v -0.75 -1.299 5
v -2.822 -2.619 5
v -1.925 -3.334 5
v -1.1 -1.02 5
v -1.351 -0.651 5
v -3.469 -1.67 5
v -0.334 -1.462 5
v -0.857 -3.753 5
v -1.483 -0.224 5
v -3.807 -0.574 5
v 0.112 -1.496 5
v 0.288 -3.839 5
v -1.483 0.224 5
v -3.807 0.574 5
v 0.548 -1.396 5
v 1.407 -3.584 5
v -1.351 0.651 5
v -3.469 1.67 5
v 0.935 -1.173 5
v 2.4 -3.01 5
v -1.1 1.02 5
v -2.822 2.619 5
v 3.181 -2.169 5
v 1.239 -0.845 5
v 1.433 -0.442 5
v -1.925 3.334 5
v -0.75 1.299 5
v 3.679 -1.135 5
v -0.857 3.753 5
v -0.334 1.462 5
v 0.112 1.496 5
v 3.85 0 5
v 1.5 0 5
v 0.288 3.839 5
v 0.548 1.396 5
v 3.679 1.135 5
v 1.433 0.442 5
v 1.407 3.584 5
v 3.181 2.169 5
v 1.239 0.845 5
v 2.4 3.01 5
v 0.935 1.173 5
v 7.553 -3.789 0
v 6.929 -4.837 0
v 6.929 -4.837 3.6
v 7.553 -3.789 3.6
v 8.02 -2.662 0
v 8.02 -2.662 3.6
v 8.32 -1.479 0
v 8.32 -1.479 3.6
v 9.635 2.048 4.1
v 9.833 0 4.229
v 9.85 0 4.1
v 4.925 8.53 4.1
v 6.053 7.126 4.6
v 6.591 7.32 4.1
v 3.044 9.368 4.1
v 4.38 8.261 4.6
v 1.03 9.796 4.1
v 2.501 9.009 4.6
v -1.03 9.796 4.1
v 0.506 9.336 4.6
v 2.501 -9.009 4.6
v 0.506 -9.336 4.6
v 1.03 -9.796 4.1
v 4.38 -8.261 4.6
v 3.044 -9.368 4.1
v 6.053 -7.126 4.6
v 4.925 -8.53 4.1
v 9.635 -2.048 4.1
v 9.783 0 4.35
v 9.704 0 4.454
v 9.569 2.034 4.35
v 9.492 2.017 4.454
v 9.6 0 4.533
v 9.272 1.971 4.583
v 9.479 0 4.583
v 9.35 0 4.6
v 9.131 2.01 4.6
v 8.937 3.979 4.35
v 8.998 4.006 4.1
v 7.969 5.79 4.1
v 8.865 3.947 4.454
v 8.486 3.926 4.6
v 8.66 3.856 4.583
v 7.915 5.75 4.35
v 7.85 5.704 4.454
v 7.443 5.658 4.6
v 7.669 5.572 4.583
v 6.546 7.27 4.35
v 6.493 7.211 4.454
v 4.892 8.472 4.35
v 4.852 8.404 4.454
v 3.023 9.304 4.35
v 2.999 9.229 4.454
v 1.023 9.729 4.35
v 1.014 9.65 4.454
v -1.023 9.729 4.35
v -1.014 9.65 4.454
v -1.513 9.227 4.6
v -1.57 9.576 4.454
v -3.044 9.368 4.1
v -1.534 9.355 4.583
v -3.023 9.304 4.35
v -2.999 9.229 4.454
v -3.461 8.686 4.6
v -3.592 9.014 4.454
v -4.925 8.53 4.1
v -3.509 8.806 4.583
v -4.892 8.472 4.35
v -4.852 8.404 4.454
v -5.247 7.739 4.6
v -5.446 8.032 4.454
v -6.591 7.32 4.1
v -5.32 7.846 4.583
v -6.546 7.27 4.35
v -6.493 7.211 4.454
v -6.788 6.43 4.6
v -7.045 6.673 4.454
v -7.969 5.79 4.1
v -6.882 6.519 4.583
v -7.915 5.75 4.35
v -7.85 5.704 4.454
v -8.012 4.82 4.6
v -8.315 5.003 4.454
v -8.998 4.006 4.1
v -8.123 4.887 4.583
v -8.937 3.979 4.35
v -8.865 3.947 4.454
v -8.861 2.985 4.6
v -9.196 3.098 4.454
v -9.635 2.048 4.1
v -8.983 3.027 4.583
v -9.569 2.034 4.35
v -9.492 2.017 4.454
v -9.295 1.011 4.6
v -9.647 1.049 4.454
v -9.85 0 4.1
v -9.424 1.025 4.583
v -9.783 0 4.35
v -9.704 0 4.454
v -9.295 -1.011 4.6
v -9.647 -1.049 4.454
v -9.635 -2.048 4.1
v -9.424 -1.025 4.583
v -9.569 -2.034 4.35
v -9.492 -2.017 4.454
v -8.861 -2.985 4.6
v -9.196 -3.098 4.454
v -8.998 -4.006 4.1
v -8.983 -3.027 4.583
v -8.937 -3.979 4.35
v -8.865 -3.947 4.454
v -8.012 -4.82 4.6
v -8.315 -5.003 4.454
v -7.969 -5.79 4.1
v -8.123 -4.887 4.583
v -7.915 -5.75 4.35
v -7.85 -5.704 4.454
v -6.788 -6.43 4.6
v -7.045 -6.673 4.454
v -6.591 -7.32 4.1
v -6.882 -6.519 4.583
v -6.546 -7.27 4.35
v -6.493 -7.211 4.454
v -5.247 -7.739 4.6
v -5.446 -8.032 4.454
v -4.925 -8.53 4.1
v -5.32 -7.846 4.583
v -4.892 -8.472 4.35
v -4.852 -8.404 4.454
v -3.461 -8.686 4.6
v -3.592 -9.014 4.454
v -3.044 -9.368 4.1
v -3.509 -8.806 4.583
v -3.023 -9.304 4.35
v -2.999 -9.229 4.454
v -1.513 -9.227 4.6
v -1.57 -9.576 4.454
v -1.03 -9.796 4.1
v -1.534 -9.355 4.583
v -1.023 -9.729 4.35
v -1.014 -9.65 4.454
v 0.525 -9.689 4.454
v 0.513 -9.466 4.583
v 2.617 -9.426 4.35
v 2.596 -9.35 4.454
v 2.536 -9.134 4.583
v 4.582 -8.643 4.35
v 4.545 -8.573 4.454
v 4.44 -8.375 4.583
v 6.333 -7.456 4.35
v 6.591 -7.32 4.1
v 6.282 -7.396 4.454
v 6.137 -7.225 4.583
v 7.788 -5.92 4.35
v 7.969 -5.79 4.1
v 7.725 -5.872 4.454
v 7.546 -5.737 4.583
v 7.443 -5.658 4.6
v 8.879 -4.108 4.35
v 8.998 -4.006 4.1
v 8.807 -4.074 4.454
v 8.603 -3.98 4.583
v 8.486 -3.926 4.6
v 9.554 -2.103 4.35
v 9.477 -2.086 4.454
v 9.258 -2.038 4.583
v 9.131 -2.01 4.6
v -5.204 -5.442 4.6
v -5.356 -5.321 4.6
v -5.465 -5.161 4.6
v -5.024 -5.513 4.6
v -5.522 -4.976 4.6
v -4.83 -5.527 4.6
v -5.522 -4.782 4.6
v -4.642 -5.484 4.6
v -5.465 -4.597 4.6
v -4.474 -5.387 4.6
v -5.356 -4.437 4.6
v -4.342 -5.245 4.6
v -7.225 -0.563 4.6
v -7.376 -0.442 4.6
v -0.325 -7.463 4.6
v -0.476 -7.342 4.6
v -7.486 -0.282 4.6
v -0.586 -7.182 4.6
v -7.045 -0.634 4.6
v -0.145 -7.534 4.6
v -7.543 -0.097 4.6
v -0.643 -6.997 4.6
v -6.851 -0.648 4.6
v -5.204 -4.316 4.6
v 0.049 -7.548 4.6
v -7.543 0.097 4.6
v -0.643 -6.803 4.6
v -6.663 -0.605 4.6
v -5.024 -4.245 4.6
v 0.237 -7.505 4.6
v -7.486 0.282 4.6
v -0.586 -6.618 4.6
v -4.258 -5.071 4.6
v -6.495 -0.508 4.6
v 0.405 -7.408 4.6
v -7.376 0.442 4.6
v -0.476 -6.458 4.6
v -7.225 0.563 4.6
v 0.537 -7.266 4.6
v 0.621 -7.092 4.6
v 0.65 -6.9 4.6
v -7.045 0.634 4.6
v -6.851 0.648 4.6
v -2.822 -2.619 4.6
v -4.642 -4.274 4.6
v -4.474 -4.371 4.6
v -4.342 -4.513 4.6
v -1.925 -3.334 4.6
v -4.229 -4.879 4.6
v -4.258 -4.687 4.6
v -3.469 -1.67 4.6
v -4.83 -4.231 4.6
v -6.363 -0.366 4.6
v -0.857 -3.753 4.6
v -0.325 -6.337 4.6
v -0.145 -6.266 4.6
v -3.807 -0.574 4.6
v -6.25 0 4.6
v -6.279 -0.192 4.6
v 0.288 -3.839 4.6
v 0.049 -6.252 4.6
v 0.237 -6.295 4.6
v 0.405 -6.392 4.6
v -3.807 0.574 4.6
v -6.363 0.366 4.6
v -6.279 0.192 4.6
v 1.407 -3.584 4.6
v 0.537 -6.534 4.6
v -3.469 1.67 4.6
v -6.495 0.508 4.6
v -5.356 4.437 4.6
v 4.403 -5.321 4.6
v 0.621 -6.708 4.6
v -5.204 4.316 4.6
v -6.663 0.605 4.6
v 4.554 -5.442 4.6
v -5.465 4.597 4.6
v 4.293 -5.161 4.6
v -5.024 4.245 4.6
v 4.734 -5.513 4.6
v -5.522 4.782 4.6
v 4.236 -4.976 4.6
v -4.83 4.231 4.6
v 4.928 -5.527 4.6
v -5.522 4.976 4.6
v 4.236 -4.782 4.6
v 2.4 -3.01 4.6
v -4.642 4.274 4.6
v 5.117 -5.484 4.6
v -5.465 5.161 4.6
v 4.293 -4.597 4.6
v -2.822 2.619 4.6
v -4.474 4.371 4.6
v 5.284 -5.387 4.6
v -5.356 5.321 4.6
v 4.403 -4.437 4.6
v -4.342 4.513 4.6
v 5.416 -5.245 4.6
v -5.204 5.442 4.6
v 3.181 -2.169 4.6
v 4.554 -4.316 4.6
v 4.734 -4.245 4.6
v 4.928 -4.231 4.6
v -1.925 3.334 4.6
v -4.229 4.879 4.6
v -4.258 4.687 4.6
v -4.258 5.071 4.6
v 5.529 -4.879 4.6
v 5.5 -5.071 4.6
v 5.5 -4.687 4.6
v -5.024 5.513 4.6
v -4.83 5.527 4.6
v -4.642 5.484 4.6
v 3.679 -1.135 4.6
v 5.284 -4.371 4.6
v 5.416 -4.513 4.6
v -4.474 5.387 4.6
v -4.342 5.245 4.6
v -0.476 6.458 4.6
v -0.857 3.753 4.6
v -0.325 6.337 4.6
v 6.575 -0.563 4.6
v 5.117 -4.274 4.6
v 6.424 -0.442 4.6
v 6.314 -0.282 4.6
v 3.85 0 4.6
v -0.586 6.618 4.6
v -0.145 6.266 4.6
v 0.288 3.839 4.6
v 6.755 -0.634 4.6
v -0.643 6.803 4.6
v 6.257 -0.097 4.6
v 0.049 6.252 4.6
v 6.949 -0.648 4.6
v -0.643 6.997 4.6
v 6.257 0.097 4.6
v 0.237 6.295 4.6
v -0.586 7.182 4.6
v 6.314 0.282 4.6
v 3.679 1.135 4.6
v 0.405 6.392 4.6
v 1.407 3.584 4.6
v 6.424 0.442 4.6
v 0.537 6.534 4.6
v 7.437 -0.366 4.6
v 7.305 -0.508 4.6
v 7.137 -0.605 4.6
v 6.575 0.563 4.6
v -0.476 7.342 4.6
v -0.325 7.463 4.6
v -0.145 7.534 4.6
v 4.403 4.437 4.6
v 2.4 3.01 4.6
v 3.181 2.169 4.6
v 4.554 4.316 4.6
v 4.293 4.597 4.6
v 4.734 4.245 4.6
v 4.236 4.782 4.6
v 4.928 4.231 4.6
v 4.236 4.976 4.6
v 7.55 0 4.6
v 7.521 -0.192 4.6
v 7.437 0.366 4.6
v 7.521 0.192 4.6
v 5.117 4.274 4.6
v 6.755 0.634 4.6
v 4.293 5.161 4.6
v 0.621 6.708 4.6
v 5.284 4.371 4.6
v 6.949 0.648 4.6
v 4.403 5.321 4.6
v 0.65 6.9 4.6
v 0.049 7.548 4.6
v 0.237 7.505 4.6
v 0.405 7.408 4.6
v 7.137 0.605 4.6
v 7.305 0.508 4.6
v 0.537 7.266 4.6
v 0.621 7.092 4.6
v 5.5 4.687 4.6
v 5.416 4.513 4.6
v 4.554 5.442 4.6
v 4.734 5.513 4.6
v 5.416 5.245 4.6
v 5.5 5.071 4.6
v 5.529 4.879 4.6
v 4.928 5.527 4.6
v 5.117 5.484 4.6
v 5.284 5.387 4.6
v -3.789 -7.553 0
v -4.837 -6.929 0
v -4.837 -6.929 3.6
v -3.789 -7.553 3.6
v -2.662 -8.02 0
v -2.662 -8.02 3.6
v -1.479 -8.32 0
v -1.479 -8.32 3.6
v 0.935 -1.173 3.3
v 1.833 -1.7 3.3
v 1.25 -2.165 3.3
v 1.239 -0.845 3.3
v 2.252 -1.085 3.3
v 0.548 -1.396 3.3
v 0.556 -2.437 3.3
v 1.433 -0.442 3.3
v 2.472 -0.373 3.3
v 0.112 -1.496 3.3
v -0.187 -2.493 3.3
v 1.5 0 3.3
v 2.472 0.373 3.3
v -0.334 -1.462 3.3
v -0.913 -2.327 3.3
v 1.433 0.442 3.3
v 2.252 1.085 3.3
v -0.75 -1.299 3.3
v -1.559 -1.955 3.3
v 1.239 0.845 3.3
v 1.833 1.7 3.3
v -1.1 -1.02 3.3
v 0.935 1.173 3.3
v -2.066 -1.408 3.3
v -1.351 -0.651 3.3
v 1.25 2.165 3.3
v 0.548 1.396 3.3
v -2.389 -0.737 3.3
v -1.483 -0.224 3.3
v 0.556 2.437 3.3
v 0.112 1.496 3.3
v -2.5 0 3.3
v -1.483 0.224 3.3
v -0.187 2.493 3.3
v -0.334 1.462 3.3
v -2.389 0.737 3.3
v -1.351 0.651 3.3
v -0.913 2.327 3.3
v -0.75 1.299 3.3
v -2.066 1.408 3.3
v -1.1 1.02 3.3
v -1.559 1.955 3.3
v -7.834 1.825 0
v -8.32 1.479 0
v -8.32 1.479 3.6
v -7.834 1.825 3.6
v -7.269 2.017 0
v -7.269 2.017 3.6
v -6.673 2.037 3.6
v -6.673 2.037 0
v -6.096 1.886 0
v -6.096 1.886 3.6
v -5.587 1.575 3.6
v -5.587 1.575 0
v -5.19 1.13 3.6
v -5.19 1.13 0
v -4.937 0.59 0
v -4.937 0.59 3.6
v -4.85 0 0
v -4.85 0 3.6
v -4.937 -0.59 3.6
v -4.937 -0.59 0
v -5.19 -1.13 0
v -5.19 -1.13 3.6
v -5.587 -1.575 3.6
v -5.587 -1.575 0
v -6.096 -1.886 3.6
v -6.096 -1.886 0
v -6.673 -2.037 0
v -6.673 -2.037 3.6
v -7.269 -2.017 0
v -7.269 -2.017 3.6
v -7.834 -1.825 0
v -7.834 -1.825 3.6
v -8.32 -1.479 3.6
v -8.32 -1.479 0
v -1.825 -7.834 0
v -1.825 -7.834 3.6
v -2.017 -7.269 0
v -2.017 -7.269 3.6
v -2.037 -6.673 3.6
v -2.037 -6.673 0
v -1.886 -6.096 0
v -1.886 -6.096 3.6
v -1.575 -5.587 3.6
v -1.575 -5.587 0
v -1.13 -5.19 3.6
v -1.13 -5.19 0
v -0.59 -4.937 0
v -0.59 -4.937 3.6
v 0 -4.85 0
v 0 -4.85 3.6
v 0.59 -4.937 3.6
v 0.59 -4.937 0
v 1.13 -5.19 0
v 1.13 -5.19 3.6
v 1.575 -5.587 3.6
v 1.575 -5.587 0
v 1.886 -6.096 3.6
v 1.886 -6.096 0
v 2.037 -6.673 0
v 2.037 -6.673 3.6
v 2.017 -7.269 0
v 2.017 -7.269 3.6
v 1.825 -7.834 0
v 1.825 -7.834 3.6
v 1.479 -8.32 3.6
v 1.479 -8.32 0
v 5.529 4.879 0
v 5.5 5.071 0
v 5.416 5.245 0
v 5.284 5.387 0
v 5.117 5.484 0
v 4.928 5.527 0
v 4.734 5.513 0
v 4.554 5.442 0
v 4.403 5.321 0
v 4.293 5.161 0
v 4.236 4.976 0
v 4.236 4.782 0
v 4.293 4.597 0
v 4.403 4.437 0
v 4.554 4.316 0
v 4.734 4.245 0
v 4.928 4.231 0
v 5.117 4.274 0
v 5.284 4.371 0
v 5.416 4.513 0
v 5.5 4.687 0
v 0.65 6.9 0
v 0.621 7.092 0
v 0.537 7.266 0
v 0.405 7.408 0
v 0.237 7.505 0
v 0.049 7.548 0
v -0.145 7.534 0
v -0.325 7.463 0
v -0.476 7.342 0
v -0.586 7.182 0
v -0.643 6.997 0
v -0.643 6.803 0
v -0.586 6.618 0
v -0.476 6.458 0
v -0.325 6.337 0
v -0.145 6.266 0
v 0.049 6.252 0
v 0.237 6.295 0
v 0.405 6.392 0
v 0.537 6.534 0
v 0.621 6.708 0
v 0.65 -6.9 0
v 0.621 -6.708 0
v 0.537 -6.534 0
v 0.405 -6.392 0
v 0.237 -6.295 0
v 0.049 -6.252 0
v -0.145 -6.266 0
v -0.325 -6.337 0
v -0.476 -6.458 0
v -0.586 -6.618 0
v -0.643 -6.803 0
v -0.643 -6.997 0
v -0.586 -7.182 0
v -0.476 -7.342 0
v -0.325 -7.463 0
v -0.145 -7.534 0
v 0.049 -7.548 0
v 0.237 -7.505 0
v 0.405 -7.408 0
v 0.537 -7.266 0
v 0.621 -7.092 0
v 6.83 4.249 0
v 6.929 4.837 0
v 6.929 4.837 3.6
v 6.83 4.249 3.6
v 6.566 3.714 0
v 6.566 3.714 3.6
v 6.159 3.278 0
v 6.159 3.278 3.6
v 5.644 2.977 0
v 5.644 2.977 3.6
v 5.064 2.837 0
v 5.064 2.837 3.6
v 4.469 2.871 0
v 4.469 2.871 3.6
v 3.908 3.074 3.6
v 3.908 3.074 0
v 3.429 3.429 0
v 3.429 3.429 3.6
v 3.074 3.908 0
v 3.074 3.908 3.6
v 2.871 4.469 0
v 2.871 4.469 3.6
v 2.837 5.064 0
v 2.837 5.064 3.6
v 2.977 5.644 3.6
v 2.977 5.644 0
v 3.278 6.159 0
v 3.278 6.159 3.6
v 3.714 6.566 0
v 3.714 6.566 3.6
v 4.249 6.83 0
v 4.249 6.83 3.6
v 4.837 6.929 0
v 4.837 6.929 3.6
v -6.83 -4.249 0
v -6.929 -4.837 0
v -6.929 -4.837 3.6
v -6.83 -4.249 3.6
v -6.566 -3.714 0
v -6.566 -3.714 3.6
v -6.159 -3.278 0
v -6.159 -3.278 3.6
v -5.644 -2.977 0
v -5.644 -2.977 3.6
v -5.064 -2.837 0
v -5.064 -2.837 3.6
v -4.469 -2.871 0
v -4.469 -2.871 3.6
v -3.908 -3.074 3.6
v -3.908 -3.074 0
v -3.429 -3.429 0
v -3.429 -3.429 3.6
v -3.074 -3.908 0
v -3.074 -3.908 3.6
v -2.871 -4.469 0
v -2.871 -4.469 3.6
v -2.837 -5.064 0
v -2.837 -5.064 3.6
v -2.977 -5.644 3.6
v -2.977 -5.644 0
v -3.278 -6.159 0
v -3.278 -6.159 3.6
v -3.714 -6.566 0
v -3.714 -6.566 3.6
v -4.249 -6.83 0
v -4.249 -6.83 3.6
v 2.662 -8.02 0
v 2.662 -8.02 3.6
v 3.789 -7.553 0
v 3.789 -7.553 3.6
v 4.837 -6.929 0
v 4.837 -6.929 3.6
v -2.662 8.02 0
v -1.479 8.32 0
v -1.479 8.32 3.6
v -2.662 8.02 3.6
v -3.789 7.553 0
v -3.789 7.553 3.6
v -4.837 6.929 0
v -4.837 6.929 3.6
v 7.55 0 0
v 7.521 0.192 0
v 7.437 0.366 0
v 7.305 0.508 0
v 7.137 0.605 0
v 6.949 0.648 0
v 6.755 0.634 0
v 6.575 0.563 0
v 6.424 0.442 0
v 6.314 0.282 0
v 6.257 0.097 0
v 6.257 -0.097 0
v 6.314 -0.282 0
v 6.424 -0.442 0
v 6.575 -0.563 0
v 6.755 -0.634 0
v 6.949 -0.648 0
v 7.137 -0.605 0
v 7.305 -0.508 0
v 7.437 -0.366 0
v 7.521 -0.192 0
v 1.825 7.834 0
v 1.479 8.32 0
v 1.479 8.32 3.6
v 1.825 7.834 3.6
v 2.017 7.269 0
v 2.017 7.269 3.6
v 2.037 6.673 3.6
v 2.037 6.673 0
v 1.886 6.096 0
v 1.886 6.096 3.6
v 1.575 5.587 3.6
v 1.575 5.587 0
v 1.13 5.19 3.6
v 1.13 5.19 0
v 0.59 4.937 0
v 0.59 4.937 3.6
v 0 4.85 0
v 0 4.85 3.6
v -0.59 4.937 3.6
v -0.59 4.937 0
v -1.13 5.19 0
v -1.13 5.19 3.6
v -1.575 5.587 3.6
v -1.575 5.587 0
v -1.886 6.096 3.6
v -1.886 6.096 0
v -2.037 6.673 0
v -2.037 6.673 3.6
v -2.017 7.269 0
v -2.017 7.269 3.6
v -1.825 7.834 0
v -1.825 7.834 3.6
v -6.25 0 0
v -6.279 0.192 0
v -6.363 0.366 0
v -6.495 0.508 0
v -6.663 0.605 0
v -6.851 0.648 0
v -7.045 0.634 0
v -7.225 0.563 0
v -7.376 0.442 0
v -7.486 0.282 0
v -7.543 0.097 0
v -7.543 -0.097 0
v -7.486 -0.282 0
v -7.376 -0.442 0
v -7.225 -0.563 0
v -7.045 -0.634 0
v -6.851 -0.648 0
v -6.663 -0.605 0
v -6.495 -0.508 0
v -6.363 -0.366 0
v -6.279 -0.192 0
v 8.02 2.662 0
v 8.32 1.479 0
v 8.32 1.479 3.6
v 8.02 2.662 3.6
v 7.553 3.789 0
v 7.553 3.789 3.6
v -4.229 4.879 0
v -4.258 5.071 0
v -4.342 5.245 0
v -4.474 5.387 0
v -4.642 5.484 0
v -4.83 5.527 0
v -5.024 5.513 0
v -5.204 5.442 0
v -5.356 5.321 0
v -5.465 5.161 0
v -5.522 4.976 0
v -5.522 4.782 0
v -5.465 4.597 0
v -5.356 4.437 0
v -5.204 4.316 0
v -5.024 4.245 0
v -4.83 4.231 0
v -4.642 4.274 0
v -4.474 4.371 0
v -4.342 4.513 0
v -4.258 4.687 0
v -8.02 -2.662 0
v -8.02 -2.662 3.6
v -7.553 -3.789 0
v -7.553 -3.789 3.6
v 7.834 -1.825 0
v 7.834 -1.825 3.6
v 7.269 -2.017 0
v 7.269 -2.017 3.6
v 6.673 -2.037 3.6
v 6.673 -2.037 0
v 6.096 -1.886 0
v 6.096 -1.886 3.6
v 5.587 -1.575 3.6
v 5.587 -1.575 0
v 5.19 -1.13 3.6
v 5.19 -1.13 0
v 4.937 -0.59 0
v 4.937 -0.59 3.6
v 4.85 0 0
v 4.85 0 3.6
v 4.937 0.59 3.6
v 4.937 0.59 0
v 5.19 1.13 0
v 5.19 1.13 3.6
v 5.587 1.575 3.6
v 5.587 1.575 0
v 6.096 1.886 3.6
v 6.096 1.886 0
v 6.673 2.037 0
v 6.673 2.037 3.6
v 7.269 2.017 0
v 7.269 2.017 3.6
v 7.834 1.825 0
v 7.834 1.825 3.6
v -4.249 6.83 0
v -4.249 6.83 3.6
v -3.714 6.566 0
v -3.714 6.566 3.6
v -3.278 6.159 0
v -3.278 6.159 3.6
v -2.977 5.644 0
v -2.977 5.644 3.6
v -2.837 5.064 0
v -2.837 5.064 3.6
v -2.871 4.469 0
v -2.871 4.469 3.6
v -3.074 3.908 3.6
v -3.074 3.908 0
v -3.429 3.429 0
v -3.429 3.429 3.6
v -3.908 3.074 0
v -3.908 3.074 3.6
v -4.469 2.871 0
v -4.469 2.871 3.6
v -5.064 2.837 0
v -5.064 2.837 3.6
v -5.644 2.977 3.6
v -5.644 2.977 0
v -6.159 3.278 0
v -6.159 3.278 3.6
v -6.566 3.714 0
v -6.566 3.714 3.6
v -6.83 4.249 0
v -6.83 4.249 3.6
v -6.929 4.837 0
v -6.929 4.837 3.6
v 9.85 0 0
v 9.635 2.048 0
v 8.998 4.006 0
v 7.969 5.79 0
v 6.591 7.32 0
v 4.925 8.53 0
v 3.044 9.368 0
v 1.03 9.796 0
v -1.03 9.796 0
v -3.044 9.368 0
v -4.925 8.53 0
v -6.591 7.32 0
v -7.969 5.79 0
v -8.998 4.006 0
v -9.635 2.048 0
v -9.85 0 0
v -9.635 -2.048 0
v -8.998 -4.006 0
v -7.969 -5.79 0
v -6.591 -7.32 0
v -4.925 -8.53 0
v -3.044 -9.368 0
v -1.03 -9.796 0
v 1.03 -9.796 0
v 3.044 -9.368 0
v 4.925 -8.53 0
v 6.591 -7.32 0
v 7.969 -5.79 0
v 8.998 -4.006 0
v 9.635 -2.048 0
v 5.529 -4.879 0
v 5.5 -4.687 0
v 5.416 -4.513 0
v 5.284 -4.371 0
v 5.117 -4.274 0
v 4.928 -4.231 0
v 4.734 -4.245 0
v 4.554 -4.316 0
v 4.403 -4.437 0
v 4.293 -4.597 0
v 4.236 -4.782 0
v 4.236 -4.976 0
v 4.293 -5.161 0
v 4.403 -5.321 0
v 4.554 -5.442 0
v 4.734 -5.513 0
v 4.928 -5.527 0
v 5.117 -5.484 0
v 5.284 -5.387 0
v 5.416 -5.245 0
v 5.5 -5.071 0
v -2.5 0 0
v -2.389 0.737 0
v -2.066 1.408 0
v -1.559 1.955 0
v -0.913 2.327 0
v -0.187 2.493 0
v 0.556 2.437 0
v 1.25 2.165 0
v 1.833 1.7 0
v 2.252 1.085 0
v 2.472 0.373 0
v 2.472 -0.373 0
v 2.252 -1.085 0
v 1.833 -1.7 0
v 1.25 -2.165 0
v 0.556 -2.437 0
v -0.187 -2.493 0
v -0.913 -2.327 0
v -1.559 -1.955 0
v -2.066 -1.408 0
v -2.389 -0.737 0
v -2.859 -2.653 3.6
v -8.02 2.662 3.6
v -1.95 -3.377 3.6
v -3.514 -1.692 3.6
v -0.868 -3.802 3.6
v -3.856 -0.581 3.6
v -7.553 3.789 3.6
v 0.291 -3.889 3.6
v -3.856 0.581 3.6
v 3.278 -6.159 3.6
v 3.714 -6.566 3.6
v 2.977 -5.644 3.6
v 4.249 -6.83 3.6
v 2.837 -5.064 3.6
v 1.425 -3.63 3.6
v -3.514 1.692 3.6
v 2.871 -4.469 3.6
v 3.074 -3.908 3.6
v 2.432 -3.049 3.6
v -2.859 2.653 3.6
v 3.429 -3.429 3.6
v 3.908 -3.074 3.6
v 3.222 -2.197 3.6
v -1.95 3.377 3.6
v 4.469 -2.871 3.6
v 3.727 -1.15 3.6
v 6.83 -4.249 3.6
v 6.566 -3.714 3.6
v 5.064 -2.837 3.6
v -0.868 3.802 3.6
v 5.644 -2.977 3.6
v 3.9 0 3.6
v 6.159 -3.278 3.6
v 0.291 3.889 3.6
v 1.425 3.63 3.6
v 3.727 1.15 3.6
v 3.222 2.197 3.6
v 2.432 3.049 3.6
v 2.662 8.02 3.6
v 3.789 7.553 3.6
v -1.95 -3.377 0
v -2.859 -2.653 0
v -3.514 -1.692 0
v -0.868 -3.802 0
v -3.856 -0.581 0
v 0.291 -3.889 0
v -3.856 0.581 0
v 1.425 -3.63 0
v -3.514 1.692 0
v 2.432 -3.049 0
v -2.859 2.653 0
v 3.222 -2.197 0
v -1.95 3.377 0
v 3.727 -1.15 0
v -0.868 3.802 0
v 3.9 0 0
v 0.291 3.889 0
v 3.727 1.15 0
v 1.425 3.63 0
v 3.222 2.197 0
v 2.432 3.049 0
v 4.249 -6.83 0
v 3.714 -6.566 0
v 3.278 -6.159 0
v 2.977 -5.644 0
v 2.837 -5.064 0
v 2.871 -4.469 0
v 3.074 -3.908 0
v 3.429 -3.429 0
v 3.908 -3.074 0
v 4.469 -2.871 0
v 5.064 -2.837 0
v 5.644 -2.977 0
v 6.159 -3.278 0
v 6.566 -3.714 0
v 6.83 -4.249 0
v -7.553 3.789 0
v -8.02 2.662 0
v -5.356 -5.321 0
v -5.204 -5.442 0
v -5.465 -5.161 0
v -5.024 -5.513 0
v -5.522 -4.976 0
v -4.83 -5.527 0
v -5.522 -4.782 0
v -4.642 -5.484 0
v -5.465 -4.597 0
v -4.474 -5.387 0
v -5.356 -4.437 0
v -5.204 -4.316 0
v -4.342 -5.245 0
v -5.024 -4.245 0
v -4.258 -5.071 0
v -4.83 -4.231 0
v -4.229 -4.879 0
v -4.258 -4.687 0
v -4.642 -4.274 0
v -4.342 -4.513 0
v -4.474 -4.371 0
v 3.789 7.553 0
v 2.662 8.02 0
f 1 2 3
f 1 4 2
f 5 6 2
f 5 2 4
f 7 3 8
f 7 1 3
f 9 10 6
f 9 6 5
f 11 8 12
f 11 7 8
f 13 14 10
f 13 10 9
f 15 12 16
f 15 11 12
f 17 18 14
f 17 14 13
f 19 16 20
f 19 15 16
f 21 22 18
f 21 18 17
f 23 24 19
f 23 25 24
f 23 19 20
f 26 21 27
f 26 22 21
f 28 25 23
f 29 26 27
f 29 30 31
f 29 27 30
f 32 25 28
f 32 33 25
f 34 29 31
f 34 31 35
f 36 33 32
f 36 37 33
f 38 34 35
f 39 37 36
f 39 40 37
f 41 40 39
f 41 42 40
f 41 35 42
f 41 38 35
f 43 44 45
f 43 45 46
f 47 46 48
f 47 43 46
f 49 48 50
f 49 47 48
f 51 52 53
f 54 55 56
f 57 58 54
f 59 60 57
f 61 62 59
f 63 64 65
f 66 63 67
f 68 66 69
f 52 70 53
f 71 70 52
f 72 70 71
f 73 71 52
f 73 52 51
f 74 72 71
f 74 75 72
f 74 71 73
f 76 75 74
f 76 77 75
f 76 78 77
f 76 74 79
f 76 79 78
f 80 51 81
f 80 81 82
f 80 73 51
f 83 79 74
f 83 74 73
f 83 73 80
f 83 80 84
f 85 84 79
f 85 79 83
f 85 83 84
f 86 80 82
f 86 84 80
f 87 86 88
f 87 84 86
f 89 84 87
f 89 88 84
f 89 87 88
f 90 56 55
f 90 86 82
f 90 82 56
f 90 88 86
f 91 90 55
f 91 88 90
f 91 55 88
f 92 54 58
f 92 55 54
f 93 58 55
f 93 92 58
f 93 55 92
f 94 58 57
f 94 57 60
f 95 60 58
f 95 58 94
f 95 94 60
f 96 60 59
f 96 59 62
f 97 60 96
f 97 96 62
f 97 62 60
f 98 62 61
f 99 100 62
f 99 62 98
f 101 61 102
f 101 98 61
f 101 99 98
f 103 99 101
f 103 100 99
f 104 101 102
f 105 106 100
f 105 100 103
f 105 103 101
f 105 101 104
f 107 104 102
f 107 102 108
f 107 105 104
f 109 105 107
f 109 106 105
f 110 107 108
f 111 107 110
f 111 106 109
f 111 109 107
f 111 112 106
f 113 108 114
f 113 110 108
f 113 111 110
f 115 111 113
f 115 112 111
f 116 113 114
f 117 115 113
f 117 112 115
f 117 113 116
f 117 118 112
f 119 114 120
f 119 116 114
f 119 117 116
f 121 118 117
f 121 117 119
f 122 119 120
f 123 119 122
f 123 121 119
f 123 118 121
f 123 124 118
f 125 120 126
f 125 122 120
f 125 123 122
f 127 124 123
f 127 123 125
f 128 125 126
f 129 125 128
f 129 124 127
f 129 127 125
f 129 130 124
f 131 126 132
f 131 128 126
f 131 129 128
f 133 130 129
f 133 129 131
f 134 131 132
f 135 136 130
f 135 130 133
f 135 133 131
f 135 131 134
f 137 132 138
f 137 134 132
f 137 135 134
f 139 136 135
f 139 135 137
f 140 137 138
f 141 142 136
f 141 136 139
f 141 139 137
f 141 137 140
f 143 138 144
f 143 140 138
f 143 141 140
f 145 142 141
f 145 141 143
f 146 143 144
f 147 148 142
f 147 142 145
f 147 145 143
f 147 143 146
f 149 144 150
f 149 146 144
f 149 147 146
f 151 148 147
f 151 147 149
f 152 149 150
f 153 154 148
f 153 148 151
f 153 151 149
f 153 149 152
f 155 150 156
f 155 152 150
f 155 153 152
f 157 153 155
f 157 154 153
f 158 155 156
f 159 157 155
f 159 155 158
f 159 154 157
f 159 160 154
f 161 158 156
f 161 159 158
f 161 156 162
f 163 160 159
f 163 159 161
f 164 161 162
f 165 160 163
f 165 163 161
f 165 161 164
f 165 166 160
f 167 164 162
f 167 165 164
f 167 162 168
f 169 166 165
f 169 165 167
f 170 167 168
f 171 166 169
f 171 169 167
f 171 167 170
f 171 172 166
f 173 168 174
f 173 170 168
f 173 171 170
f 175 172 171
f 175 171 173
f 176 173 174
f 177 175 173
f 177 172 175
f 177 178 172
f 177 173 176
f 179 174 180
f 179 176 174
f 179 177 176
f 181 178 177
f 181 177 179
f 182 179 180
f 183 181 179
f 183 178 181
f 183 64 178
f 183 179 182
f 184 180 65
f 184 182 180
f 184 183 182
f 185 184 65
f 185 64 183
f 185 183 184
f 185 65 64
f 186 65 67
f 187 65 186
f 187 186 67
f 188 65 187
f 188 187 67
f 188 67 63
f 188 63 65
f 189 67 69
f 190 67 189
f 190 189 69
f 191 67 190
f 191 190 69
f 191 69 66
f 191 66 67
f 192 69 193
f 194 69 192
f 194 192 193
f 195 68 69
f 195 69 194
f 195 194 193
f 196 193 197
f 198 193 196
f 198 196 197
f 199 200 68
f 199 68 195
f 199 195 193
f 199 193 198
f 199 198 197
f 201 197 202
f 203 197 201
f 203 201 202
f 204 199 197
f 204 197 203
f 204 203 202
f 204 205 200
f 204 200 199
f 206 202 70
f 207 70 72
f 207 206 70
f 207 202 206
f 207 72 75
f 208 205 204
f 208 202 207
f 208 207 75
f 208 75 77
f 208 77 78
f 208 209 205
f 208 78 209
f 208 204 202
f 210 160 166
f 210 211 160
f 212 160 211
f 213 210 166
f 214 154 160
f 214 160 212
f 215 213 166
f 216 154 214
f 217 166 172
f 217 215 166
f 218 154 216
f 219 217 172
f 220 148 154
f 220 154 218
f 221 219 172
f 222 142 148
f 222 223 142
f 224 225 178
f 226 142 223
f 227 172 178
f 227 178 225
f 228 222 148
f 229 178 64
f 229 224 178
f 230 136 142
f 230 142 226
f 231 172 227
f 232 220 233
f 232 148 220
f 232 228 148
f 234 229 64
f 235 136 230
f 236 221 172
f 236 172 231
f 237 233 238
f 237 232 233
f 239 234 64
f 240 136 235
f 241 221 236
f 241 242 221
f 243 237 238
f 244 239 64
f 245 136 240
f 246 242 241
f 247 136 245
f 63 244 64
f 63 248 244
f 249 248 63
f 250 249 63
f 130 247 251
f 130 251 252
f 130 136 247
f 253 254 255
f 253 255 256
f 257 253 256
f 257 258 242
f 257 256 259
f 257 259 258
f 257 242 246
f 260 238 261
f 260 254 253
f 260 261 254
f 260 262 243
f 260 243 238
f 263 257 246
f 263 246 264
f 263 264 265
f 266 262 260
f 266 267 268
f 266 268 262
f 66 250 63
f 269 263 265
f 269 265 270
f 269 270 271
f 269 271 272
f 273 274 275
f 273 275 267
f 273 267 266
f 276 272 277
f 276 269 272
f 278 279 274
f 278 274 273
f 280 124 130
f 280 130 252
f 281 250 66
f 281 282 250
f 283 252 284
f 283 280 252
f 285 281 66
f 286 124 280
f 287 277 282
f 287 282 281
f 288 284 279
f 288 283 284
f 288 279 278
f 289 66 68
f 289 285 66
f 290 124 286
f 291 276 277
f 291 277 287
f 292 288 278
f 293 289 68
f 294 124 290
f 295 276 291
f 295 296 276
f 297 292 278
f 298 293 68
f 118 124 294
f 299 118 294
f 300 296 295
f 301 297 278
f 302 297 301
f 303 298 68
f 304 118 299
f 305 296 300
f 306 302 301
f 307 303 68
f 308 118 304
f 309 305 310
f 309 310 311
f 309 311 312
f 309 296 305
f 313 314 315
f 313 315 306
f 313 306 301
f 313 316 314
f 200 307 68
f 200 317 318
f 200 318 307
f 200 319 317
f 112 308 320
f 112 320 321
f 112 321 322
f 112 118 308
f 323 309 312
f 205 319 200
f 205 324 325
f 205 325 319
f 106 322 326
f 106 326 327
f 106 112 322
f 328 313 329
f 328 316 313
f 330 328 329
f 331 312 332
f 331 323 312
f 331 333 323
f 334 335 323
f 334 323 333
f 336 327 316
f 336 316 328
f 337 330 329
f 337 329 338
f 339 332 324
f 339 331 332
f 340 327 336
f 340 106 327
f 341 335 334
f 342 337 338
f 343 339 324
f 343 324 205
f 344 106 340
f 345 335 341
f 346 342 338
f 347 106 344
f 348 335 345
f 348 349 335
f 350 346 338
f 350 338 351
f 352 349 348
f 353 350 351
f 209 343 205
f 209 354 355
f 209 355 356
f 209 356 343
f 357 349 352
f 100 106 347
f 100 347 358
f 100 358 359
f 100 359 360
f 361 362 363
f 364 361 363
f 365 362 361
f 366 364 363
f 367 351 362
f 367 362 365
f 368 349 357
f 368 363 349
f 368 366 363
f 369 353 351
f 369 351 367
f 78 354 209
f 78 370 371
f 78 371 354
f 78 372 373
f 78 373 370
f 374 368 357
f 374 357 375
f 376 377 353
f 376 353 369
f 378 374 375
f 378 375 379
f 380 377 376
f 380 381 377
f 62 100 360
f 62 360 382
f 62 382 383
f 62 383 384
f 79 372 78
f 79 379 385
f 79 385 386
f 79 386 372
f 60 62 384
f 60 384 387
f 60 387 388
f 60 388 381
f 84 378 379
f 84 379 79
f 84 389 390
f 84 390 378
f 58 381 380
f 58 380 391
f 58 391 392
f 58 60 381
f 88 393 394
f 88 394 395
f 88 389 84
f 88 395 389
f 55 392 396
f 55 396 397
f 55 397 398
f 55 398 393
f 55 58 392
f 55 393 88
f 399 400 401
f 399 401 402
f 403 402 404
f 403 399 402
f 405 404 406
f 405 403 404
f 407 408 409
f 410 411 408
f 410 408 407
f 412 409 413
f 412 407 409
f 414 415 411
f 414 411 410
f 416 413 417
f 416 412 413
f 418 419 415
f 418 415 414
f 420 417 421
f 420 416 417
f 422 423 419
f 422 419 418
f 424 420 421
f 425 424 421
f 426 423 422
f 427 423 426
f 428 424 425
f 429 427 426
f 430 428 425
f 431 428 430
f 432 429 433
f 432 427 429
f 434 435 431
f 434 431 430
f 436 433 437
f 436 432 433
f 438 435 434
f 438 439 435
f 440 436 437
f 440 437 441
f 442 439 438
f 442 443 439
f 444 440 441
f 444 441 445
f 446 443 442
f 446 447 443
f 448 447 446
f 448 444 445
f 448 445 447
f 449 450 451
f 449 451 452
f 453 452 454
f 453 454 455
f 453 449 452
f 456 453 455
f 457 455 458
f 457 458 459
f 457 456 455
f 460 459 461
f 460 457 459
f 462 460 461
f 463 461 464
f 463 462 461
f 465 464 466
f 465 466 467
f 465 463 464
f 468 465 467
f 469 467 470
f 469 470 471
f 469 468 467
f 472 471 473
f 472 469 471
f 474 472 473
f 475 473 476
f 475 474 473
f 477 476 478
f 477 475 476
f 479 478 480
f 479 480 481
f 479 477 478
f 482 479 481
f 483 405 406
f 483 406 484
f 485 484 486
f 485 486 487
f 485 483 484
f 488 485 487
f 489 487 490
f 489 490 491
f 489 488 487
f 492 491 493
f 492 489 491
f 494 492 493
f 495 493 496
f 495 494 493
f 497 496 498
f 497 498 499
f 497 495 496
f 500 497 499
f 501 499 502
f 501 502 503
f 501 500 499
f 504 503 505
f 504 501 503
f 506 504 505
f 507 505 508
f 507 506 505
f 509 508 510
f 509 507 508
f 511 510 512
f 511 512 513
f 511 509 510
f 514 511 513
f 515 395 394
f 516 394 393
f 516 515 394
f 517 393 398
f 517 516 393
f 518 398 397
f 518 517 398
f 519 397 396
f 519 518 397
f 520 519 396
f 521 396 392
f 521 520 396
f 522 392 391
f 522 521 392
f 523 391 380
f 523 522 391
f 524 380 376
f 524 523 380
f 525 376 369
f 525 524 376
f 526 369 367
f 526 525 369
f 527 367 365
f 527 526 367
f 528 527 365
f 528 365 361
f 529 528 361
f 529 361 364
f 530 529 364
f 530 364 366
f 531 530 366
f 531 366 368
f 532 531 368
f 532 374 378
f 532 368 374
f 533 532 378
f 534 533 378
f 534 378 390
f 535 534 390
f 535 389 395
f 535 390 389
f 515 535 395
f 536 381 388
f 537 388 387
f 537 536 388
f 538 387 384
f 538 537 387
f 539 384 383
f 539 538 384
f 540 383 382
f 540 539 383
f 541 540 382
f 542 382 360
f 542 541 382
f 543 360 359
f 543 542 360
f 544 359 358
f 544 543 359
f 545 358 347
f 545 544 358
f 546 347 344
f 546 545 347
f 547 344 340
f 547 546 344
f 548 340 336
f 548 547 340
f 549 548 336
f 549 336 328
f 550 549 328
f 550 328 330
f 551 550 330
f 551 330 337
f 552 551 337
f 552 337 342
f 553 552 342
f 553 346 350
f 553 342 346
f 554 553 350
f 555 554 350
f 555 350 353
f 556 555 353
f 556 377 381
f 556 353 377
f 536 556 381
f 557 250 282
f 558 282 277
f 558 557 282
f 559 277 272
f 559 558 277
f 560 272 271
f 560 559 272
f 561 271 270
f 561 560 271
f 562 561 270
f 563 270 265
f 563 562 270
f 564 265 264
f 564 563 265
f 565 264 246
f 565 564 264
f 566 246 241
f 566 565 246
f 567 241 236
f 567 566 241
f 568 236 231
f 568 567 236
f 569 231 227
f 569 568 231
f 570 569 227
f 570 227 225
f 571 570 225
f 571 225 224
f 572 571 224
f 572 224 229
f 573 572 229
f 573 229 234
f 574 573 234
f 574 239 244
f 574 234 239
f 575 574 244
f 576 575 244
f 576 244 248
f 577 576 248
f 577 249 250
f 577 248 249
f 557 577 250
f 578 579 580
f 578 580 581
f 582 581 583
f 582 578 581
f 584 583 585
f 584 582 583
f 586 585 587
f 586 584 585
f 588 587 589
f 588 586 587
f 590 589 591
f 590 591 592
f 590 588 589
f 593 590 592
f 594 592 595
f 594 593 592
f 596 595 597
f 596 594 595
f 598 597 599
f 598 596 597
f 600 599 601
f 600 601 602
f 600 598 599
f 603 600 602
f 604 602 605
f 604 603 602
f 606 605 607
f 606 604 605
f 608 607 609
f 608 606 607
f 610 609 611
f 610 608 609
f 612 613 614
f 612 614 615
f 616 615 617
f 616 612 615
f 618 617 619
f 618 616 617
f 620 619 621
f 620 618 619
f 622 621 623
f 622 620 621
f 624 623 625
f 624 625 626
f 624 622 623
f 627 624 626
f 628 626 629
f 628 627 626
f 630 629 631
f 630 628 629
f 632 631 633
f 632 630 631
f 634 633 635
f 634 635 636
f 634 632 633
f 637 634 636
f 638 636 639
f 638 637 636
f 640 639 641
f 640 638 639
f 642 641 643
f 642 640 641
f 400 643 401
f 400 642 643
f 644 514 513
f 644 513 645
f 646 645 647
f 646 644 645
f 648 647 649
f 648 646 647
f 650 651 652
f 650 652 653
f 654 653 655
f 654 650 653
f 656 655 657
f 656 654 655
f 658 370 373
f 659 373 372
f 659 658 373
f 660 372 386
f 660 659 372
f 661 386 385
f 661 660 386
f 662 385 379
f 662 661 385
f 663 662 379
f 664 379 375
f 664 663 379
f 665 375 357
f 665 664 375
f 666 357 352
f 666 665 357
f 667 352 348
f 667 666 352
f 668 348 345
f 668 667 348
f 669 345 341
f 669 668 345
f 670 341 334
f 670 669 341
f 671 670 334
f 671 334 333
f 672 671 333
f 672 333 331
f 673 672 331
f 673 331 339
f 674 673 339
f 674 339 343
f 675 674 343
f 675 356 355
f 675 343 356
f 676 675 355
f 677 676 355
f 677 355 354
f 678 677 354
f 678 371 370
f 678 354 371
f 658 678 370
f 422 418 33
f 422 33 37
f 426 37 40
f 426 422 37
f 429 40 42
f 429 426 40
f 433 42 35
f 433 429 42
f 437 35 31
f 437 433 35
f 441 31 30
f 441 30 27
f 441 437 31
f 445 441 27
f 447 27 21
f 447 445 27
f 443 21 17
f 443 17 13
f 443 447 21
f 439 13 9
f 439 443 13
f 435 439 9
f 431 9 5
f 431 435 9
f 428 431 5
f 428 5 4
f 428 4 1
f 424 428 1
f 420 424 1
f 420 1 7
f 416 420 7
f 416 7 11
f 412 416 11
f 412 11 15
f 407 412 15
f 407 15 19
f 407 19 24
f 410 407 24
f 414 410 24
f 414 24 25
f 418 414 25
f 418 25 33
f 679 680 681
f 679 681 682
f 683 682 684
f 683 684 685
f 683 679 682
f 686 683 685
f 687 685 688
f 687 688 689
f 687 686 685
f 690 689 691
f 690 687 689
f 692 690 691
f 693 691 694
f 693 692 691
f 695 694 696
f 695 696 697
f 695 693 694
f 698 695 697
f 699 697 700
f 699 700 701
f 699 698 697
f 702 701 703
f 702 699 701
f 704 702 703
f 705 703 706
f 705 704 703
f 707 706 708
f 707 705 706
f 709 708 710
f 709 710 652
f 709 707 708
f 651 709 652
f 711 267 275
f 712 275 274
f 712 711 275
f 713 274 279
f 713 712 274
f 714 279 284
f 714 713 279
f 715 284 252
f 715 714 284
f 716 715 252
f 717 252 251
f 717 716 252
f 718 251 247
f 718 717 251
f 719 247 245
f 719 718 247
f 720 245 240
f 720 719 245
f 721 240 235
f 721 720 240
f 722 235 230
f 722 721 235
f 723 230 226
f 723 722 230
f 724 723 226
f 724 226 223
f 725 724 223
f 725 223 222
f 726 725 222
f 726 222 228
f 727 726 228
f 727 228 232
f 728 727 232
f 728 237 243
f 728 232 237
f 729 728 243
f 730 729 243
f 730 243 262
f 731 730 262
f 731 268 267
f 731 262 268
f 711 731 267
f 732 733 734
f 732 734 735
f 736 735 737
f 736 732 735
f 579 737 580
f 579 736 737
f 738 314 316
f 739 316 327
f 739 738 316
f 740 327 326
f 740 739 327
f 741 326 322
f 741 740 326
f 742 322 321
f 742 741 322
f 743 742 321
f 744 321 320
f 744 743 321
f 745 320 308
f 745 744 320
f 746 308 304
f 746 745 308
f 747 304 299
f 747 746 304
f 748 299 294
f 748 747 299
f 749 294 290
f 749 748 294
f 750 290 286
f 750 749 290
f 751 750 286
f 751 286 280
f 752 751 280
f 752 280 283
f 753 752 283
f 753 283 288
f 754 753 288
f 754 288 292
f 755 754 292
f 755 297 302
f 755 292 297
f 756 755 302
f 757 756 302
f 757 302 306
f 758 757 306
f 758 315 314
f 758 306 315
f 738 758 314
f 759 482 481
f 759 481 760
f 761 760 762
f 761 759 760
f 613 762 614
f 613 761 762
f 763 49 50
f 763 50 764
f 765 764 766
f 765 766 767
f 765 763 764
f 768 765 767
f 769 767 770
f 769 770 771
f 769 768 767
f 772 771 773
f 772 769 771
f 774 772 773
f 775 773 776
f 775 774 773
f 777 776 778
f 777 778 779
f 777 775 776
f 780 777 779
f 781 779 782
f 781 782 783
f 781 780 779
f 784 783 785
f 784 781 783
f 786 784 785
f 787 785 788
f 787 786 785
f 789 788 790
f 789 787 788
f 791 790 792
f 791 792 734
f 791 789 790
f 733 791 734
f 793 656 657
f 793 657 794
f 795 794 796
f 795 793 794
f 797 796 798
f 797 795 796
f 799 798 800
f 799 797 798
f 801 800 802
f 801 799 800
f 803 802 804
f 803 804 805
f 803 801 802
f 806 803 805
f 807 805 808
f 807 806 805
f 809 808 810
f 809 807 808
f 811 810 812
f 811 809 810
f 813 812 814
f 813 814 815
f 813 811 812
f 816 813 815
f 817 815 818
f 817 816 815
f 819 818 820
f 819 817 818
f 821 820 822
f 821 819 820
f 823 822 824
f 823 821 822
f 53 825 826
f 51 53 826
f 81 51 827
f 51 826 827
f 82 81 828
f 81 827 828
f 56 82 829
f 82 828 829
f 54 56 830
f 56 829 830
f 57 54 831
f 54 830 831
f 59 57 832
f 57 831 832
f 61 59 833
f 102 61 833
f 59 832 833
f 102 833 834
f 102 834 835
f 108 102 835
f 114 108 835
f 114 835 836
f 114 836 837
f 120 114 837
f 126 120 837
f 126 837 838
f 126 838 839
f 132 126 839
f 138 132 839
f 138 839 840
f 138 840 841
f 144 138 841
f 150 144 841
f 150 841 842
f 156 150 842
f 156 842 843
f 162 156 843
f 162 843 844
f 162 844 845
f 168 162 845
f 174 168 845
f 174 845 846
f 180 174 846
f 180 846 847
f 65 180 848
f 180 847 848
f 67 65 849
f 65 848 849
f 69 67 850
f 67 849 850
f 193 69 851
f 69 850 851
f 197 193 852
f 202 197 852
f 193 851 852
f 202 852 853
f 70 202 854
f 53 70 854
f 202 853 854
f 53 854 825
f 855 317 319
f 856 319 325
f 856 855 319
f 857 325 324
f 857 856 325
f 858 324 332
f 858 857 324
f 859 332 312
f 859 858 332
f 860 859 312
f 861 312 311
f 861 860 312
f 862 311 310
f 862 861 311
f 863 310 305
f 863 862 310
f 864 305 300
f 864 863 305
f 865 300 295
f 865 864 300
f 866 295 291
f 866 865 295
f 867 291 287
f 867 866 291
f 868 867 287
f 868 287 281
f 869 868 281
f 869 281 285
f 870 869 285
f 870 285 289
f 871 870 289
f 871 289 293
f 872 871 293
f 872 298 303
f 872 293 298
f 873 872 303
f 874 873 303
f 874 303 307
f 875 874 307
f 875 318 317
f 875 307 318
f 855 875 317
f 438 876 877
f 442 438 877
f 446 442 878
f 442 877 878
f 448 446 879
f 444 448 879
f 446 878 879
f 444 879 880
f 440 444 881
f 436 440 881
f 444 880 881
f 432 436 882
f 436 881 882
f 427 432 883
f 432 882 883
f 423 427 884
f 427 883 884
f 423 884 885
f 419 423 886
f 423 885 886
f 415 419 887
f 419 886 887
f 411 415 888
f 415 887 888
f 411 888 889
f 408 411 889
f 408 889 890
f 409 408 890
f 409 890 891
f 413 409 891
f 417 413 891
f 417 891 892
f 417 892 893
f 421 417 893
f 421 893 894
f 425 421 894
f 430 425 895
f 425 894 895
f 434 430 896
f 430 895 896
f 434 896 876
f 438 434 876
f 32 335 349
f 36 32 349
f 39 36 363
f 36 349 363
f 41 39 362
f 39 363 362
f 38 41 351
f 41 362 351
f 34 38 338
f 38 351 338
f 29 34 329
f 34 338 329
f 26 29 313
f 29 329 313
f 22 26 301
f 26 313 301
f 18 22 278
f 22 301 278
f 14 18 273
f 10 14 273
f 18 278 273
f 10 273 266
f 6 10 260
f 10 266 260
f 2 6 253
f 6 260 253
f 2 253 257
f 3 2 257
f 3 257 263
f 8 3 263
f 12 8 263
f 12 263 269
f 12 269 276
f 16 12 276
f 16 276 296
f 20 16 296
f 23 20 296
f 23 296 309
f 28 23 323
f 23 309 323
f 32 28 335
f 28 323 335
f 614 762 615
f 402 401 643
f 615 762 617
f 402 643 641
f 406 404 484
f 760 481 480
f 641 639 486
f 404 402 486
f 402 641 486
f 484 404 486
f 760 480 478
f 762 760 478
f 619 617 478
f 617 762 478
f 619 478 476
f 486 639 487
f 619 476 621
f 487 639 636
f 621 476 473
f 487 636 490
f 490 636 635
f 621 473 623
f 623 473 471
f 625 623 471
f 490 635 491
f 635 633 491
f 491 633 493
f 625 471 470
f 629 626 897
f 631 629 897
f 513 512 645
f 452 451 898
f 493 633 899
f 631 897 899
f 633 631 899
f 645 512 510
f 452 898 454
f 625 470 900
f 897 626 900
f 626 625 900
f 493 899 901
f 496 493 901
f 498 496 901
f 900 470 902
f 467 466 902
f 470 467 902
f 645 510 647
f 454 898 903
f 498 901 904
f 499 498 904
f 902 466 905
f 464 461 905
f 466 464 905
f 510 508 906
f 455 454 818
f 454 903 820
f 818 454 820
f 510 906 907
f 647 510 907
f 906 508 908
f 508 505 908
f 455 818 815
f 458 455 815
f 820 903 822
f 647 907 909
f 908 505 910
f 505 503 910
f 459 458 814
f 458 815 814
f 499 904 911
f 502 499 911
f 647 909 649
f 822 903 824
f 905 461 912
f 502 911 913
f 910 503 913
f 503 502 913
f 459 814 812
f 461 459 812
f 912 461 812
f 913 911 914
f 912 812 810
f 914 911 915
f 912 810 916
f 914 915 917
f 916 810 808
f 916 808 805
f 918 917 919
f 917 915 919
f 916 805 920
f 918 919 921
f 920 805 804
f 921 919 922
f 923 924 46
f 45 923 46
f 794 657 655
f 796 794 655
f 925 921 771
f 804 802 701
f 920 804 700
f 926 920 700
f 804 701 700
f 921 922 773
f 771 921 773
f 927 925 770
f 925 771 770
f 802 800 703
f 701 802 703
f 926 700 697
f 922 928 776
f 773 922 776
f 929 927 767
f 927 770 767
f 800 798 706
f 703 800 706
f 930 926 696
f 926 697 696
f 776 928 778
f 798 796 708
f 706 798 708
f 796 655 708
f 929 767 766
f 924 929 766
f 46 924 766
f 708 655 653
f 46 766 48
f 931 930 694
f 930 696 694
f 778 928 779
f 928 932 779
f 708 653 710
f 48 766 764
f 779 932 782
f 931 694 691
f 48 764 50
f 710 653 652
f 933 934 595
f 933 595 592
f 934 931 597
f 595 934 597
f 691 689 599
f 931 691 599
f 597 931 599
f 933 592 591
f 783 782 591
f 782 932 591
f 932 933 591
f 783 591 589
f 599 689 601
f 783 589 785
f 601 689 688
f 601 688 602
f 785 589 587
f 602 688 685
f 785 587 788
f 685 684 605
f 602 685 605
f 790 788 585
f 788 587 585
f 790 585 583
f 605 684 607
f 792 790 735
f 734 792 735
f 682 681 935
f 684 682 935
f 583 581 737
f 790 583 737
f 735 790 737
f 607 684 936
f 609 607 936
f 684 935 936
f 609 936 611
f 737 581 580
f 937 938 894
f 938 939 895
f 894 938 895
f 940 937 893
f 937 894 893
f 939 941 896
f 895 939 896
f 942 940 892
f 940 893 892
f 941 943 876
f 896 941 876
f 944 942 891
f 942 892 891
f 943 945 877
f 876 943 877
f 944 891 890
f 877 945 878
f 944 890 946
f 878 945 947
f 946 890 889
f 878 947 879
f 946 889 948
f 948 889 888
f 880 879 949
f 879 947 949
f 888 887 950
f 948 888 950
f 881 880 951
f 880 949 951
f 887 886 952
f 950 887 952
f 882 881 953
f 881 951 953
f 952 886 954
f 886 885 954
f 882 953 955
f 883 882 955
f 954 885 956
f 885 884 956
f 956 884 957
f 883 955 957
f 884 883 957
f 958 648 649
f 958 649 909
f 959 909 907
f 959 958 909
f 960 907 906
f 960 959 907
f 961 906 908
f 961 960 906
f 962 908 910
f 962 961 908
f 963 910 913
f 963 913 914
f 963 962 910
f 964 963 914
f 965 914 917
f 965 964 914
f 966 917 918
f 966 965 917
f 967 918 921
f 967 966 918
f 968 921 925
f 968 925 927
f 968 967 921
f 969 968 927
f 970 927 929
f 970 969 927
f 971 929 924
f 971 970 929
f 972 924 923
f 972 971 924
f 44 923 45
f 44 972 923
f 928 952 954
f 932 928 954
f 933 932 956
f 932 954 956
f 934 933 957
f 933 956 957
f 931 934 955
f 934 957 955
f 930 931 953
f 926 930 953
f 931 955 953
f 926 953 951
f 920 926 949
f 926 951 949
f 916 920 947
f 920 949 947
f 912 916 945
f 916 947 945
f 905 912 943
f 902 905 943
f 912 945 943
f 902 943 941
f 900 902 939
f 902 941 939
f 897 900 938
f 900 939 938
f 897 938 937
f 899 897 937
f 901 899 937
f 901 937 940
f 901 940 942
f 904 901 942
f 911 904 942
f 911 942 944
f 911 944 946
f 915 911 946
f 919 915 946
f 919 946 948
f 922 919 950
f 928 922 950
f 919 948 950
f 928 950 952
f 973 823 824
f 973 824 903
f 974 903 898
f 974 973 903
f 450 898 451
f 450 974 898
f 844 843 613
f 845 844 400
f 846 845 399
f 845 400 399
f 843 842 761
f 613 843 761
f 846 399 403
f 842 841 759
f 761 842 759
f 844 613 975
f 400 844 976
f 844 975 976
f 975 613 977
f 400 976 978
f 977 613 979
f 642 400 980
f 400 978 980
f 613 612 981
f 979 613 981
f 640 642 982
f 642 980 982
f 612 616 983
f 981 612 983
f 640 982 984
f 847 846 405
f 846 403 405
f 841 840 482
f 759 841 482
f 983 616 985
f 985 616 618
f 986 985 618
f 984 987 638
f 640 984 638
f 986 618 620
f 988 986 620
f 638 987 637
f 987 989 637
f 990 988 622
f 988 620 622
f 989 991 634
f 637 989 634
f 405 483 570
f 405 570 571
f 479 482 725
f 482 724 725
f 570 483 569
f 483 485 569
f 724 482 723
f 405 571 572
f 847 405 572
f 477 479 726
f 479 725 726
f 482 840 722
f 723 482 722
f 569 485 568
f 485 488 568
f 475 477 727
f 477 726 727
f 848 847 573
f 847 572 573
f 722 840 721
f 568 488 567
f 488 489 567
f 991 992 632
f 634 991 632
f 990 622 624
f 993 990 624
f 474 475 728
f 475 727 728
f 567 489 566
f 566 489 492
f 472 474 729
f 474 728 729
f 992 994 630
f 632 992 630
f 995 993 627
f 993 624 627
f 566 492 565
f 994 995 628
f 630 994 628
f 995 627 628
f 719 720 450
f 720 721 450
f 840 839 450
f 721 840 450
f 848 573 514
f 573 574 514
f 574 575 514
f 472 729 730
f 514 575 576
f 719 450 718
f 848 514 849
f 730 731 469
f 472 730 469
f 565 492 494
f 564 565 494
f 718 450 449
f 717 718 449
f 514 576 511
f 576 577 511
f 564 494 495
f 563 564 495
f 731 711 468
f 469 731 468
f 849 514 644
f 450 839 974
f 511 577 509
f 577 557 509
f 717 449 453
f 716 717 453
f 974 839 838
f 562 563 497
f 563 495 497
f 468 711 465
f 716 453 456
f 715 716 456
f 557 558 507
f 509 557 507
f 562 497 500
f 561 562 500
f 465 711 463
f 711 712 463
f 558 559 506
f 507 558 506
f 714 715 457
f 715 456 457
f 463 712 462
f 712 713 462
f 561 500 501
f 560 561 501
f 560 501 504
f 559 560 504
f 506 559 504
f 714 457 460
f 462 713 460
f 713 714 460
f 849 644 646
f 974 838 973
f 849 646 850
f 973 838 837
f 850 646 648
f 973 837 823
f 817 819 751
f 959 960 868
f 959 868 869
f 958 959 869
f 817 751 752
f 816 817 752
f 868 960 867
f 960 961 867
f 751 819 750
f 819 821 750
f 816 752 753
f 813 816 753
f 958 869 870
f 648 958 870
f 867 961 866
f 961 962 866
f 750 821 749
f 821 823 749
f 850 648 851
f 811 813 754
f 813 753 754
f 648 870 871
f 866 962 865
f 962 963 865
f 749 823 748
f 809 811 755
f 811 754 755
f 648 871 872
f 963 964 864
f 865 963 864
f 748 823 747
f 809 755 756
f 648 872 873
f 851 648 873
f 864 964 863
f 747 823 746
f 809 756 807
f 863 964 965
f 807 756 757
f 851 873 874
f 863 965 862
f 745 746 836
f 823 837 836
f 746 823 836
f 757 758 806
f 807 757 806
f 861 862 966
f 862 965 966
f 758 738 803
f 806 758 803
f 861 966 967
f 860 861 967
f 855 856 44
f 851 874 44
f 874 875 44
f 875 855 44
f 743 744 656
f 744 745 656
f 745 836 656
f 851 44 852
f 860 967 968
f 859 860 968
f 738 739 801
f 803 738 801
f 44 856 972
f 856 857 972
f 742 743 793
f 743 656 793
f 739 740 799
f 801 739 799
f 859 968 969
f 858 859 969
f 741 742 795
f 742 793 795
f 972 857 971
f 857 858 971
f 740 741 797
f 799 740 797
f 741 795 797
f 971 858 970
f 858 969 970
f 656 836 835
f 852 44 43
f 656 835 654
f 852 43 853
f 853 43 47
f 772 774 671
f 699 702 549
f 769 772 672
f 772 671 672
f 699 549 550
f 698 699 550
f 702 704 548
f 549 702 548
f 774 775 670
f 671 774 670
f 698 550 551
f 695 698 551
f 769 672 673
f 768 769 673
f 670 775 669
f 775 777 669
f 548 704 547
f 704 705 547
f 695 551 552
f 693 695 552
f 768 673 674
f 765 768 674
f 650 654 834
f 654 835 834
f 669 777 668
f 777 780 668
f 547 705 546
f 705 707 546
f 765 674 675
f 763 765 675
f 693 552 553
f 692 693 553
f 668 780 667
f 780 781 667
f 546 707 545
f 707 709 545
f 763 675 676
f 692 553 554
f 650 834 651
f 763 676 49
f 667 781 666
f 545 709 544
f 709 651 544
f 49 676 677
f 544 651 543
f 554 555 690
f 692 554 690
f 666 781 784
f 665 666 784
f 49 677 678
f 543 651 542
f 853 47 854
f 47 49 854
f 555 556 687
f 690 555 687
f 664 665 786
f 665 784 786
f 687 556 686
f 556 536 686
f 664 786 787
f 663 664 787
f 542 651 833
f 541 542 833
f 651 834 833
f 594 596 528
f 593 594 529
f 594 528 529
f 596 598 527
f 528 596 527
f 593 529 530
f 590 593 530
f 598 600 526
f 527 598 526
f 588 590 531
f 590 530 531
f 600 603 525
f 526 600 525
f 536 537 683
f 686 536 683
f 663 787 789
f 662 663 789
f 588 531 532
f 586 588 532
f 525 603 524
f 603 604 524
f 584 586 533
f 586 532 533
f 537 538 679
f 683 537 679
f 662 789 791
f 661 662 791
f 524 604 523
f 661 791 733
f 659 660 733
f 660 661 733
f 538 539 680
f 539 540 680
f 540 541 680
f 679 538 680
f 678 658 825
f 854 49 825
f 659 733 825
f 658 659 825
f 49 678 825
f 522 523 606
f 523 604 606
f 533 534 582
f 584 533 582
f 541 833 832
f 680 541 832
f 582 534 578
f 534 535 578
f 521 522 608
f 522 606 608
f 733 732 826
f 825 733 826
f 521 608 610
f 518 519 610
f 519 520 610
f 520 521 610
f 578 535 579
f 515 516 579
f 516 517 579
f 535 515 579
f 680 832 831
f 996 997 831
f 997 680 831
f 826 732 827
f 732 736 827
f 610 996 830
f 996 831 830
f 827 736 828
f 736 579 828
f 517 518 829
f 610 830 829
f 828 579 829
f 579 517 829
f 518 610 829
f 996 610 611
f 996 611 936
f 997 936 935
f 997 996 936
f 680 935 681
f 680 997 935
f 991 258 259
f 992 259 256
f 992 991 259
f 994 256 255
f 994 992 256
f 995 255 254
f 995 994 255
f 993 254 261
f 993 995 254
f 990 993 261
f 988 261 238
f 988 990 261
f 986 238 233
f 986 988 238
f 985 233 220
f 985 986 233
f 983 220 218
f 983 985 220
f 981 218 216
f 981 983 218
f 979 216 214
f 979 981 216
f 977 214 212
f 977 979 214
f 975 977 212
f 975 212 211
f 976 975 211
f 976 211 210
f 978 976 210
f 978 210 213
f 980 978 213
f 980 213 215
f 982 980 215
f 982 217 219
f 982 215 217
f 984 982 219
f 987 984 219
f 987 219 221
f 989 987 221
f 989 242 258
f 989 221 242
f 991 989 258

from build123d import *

# Parameters (mm, degrees)
SKETCH1_R           = 9.85
SKETCH1_R_2         = 1.5
SKETCH1_R_3         = 0.65
BOSS_EXTRUDE1_DEPTH = 5
SKETCH4_R           = 2.5
CUT_EXTRUDE2_DEPTH  = 3.3
SHELL1_OUTLINE_R    = 3.9
SHELL1_DEPTH        = 3.6
CUT_EXTRUDE1_START  = -0.4
SKETCH3_R           = 9.85
SKETCH3_R_2         = 3.85
CUT_EXTRUDE1_DEPTH  = 0.4
FILLET1_R           = 0.5


# Read off the part's stored shape, not the designer's step: Shell1
with BuildPart() as part:
    # Sketch1 → Boss-Extrude1 (new body)
    with BuildSketch(Plane.XY):
        Circle(SKETCH1_R)
        Circle(SKETCH1_R_2, mode=Mode.SUBTRACT)
        with Locations((0, 6.9)):
            Circle(SKETCH1_R_3, mode=Mode.SUBTRACT)
        with Locations((4.87903679, 4.87903679)):
            Circle(SKETCH1_R_3, mode=Mode.SUBTRACT)
        with Locations((6.9, 0)):
            Circle(SKETCH1_R_3, mode=Mode.SUBTRACT)
        with Locations((4.87903679, -4.87903679)):
            Circle(SKETCH1_R_3, mode=Mode.SUBTRACT)
        with Locations((0, -6.9)):
            Circle(SKETCH1_R_3, mode=Mode.SUBTRACT)
        with Locations((-4.87903679, -4.87903679)):
            Circle(SKETCH1_R_3, mode=Mode.SUBTRACT)
        with Locations((-6.9, 0)):
            Circle(SKETCH1_R_3, mode=Mode.SUBTRACT)
        with Locations((-4.87903679, 4.87903679)):
            Circle(SKETCH1_R_3, mode=Mode.SUBTRACT)
    extrude(amount=BOSS_EXTRUDE1_DEPTH)

    # Sketch4 → Cut-Extrude2 (cut)
    with BuildSketch(Plane(origin=(0, 0, 0), x_dir=(-1, 0, 0), z_dir=(0, 0, -1))):
        Circle(SKETCH4_R)
    extrude(amount=-CUT_EXTRUDE2_DEPTH, mode=Mode.SUBTRACT)

    # Shell1 outline → Shell1 (cut)
    with BuildSketch(Plane.XY):
        with BuildLine():
            ThreePointArc((4.837035489, 6.928606474), (3.233675004, 7.80678205), (1.478964027, 8.319565217))
            ThreePointArc((1.478964027, 8.319565217), (0, 4.85), (-1.478964027, 8.319565217))
            ThreePointArc((-1.478964027, 8.319565217), (-3.233675004, 7.80678205), (-4.837035489, 6.928606474))
            ThreePointArc((-4.837035489, 6.928606474), (-3.429467889, 3.429467889), (-6.928606474, 4.837035489))
            ThreePointArc((-6.928606474, 4.837035489), (-7.80678205, 3.233675004), (-8.319565217, 1.478964027))
            ThreePointArc((-8.319565217, 1.478964027), (-4.85, 0), (-8.319565217, -1.478964027))
            ThreePointArc((-8.319565217, -1.478964027), (-7.80678205, -3.233675004), (-6.928606474, -4.837035489))
            ThreePointArc((-6.928606474, -4.837035489), (-3.429467889, -3.429467889), (-4.837035489, -6.928606474))
            ThreePointArc((-4.837035489, -6.928606474), (-3.233675004, -7.80678205), (-1.478964027, -8.319565217))
            ThreePointArc((-1.478964027, -8.319565217), (0, -4.85), (1.478964027, -8.319565217))
            ThreePointArc((1.478964027, -8.319565217), (3.233675004, -7.80678205), (4.837035489, -6.928606474))
            ThreePointArc((4.837035489, -6.928606474), (3.429467889, -3.429467889), (6.928606474, -4.837035489))
            ThreePointArc((6.928606474, -4.837035489), (7.80678205, -3.233675004), (8.319565217, -1.478964027))
            ThreePointArc((8.319565217, -1.478964027), (4.85, 0), (8.319565217, 1.478964027))
            ThreePointArc((8.319565217, 1.478964027), (7.80678205, 3.233675004), (6.928606474, 4.837035489))
            ThreePointArc((6.928606474, 4.837035489), (3.429467889, 3.429467889), (4.837035489, 6.928606474))
        make_face()
        Circle(SHELL1_OUTLINE_R, mode=Mode.SUBTRACT)
    extrude(amount=SHELL1_DEPTH, mode=Mode.SUBTRACT)

    # Sketch3 → Cut-Extrude1 (cut)
    with BuildSketch(Plane.XY.offset(5).offset(CUT_EXTRUDE1_START)):
        Circle(SKETCH3_R)
        Circle(SKETCH3_R_2, mode=Mode.SUBTRACT)
    extrude(amount=CUT_EXTRUDE1_DEPTH, mode=Mode.SUBTRACT)

    # Fillet1
    fillet1_edges = [part.edges().sort_by_distance(p)[0] for p in [
        (-9.85, 0, 4.6),
    ]]
    fillet(fillet1_edges, radius=FILLET1_R)


solid = part.part
